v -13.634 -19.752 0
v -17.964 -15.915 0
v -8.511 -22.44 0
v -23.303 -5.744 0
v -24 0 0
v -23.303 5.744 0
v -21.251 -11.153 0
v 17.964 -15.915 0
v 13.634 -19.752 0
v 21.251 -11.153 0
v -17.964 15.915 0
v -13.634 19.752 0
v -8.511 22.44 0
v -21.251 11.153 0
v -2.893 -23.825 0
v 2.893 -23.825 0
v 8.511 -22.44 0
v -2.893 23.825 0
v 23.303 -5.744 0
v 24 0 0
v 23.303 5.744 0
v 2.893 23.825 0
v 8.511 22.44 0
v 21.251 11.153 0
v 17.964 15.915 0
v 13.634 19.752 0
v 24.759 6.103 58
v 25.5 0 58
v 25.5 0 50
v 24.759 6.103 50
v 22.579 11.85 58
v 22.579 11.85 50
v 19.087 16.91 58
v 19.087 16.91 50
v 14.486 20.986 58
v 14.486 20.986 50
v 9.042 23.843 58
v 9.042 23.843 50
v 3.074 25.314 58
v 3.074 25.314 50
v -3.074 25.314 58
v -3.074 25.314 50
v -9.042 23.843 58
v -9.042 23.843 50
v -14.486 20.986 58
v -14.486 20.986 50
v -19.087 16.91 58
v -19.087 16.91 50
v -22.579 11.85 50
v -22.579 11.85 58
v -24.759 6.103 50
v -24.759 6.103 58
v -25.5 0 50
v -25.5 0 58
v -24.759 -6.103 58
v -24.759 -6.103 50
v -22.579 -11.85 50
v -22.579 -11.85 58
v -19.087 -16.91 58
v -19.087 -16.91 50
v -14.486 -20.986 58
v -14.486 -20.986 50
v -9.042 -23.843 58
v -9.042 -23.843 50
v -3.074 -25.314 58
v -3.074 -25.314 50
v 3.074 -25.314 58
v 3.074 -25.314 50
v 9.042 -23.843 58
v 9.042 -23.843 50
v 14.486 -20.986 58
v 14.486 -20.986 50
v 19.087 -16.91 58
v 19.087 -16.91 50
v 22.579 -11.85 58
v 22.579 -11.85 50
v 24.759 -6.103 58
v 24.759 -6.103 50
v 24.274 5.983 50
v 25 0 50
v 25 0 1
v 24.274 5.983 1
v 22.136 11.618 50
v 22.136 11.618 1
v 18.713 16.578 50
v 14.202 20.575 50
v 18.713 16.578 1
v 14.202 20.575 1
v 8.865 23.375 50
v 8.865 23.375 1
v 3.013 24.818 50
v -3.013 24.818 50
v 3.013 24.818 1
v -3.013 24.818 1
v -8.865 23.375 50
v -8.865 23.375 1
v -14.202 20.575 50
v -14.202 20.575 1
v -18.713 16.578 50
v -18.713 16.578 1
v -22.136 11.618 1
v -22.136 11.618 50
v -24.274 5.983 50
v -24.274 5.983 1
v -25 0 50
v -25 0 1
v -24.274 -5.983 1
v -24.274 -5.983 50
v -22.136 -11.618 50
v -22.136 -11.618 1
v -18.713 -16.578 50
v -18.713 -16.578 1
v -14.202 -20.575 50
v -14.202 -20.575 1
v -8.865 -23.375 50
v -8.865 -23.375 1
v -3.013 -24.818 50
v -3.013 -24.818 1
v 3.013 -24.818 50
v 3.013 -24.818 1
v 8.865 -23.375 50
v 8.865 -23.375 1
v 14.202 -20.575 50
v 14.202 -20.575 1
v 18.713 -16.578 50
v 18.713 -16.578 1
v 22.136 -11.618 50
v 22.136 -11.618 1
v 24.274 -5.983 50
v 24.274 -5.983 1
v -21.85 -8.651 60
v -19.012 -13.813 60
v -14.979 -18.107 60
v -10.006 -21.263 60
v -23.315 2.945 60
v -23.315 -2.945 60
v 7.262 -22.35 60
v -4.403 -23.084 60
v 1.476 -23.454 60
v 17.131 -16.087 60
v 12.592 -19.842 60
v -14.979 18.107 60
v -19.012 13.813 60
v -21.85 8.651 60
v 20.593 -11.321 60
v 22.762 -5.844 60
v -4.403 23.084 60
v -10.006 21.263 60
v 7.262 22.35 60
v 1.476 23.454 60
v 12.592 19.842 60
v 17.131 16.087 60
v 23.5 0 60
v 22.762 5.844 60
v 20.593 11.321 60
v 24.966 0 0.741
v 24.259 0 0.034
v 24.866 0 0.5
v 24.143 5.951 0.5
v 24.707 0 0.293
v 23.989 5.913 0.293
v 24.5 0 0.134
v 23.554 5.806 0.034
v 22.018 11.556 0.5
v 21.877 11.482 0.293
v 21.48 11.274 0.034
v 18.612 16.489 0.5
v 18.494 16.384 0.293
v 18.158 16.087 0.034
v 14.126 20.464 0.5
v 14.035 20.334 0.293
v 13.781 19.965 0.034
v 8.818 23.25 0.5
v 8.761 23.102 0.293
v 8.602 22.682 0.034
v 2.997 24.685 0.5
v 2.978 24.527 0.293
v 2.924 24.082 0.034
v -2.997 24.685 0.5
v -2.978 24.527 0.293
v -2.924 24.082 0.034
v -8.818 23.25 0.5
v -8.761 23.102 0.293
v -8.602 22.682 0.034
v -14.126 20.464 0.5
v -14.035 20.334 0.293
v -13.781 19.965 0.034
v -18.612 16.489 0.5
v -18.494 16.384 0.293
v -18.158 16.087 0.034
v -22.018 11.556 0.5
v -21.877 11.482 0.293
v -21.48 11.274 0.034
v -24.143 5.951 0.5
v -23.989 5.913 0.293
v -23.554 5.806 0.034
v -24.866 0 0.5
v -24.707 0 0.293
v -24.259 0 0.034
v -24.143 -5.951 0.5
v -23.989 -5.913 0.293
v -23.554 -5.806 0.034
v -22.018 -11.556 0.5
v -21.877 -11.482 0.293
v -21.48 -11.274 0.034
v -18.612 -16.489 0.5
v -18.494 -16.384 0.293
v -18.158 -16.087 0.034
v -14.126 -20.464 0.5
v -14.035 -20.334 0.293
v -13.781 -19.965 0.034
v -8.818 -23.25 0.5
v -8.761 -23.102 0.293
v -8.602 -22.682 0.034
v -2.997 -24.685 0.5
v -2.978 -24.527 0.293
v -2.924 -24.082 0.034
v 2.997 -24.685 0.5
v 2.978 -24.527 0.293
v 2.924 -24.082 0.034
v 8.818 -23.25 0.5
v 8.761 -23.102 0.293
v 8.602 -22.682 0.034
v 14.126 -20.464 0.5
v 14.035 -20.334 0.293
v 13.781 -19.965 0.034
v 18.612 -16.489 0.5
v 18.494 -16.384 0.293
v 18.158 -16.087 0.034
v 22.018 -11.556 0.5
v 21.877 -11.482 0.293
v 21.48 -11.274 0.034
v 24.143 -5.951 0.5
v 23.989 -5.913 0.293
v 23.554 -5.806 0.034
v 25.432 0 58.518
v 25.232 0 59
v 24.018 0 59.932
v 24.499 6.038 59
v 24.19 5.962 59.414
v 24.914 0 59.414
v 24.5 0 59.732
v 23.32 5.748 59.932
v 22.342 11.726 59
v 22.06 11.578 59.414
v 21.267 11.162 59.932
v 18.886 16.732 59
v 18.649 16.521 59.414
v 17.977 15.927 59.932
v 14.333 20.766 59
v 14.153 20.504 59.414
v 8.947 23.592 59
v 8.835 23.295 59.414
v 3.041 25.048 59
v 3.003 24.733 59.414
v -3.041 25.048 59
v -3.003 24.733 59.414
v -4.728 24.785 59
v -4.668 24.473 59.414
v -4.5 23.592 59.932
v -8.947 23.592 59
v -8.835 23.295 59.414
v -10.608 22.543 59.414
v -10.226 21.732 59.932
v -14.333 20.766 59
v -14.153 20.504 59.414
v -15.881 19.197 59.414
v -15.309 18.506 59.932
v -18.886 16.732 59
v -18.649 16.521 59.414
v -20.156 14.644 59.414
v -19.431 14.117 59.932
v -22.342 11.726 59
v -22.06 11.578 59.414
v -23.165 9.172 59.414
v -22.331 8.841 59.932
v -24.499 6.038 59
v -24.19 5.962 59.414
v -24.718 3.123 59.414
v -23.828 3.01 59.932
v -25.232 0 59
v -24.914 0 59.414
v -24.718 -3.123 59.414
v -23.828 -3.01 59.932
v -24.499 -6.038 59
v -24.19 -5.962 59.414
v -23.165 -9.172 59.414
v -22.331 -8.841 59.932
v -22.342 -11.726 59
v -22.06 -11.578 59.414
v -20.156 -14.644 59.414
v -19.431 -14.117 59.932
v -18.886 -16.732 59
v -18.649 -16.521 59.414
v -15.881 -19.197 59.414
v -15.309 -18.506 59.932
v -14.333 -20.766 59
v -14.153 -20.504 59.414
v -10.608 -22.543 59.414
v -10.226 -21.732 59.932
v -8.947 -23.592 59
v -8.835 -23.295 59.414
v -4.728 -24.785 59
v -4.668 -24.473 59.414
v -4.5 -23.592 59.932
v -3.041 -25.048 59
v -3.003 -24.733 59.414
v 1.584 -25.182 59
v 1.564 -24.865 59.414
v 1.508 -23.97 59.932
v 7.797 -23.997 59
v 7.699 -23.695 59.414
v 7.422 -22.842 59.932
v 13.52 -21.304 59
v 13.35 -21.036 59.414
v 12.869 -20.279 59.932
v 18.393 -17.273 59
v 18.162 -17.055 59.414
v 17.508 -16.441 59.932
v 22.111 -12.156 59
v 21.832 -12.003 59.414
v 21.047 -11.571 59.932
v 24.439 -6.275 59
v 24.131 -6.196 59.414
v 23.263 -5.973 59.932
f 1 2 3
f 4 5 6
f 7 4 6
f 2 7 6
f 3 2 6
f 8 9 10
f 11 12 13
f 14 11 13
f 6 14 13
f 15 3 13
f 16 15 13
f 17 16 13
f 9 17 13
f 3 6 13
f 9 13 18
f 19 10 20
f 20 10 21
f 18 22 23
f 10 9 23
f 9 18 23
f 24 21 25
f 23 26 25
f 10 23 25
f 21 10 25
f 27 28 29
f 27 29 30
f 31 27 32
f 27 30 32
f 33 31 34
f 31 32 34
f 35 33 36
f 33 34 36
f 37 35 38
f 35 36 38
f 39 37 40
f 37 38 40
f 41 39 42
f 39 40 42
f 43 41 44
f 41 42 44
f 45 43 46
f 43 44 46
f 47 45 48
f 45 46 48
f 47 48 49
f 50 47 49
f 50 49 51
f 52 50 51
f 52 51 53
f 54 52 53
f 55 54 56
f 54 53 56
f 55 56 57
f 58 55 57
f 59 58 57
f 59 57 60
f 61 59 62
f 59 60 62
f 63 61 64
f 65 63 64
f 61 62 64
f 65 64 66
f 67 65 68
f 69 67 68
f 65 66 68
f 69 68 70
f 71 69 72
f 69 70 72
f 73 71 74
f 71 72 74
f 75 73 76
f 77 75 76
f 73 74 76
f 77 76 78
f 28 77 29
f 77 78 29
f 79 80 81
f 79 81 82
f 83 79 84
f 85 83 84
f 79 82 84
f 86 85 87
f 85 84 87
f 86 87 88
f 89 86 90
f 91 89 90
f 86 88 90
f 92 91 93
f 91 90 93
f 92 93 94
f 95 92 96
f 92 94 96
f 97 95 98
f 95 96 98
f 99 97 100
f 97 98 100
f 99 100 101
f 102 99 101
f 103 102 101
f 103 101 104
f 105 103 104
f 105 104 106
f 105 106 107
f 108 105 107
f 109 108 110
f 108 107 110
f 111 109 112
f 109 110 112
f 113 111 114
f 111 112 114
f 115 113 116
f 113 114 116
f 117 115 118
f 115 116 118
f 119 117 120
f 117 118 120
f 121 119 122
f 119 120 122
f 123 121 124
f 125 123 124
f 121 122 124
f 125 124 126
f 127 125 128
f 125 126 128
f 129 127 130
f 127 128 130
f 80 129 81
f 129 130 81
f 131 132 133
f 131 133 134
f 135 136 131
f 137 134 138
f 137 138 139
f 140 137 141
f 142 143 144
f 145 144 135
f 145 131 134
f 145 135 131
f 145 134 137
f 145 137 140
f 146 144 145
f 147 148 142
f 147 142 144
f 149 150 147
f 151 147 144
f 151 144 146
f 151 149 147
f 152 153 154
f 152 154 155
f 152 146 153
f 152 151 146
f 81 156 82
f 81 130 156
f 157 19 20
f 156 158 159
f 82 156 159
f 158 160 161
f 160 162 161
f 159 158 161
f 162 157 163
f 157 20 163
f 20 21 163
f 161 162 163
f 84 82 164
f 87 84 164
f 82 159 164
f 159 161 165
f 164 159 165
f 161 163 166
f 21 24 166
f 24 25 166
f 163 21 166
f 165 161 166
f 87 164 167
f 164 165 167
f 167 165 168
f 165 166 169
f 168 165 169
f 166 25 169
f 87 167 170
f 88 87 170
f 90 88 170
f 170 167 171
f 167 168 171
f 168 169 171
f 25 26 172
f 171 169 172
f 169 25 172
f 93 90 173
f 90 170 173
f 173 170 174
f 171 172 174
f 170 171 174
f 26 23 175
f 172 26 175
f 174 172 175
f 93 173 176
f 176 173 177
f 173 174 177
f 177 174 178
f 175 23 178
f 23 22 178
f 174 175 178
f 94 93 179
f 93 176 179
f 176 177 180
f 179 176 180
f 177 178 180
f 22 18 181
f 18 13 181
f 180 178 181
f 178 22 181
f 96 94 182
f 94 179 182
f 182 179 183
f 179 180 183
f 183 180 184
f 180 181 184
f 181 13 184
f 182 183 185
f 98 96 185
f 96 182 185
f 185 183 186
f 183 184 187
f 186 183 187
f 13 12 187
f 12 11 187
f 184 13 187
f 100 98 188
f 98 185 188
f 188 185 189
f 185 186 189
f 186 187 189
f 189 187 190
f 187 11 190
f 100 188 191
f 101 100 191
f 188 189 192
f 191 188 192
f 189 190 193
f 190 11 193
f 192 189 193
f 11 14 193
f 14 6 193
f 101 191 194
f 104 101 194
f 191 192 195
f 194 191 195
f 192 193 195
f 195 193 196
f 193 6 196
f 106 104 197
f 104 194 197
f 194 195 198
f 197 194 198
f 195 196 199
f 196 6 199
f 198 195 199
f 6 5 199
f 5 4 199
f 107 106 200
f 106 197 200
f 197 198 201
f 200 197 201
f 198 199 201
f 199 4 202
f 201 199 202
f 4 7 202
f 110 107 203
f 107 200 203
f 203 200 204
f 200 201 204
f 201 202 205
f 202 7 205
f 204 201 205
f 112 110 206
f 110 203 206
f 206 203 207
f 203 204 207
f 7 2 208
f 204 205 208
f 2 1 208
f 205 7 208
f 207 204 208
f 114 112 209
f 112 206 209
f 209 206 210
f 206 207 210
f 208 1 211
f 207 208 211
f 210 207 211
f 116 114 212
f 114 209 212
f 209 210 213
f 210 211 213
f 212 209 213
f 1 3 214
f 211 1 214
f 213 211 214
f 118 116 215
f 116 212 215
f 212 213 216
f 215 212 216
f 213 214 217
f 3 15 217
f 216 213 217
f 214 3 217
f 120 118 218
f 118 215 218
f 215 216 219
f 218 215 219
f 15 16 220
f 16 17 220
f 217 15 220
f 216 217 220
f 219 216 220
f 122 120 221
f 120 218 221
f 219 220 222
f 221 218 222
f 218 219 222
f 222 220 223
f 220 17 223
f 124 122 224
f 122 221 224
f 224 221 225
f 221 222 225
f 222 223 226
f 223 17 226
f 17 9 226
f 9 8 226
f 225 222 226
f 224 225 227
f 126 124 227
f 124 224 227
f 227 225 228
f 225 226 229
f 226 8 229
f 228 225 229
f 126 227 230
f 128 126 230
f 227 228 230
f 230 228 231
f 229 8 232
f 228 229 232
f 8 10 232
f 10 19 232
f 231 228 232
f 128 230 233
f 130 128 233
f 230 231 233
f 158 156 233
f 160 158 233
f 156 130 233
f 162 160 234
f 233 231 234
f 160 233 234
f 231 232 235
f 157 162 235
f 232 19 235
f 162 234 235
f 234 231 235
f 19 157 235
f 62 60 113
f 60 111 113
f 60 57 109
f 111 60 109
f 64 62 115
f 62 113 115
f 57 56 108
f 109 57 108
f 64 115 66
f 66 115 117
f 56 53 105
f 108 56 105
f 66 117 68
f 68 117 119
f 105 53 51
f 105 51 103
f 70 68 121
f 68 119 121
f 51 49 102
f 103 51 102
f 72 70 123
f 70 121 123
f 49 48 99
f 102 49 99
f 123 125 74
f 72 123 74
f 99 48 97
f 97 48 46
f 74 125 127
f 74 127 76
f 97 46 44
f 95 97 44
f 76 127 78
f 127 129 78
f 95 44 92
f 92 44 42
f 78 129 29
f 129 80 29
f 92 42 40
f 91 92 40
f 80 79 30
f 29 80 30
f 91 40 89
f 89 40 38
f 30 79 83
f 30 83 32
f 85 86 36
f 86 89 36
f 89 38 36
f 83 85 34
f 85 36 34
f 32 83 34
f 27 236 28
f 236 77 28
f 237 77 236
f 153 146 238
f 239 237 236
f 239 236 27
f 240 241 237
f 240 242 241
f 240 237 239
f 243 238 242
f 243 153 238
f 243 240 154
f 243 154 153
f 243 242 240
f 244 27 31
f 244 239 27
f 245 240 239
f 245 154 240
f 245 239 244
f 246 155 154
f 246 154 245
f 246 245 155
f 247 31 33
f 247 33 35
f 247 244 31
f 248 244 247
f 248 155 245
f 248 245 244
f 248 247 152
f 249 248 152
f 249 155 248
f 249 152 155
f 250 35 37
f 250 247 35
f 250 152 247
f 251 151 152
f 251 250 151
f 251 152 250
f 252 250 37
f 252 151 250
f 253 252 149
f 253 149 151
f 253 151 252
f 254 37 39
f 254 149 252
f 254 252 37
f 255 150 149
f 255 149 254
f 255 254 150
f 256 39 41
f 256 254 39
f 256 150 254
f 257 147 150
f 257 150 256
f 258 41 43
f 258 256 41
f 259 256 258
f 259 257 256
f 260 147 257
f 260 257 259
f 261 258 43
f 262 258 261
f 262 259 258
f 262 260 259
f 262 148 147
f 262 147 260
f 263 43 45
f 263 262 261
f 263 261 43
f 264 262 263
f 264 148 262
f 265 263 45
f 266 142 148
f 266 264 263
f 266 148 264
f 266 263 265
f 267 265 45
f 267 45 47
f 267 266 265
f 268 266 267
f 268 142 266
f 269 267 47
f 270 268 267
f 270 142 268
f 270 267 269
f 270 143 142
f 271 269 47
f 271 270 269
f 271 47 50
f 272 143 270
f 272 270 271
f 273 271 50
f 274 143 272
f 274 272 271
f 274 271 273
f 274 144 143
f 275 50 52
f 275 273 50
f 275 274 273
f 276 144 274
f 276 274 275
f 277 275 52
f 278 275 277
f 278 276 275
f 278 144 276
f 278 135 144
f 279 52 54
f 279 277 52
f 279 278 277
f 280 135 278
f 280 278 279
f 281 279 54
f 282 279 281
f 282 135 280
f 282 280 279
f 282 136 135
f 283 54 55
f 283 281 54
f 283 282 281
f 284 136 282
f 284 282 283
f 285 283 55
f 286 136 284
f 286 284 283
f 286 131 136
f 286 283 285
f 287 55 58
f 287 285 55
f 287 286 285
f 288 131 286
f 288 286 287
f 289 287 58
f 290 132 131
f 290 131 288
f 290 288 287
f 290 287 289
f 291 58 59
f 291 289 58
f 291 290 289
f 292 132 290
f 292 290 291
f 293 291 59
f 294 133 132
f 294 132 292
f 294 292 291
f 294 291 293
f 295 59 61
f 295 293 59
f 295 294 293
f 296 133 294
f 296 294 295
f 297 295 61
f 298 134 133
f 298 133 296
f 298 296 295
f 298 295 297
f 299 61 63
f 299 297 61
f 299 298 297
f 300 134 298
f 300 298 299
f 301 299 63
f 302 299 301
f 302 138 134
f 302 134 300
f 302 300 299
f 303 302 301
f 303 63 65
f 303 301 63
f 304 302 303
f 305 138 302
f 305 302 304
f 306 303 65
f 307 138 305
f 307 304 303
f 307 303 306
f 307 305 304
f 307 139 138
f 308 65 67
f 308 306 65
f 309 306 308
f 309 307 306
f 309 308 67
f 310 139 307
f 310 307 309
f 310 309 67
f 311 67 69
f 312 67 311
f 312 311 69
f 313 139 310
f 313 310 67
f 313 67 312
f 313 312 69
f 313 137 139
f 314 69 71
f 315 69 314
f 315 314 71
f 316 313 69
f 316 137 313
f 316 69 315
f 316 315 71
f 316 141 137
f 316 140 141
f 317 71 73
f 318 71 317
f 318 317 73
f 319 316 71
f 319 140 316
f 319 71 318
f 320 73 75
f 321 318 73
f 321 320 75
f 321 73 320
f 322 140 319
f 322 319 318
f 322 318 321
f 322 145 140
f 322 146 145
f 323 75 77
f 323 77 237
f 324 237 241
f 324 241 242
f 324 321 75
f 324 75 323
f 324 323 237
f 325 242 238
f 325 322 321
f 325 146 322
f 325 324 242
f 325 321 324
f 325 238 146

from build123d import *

# Parameters (mm, degrees)
F0_R     = 25
F1_DEPTH = 50
F2_R     = 25.5
F3_DEPTH = 10
F4_R     = 2
F5_R     = 1


with BuildPart() as f1:
    # F0 (on Top) → F1 (new body)
    with BuildSketch(Plane.XY):
        Circle(F0_R)
    extrude(amount=F1_DEPTH)

    # F2 (on face) → F3 (join)
    with BuildSketch(Plane.XY.offset(50)):
        Circle(F2_R)
    extrude(amount=F3_DEPTH)

    # F4
    f4_edges = [f1.edges().sort_by_distance(p)[0] for p in [
        (-25.5, 0, 60),
    ]]
    fillet(f4_edges, radius=F4_R)

    # F5
    f5_edges = [f1.edges().sort_by_distance(p)[0] for p in [
        (-25, 0, 0),
    ]]
    fillet(f5_edges, radius=F5_R)


solid = f1.part
